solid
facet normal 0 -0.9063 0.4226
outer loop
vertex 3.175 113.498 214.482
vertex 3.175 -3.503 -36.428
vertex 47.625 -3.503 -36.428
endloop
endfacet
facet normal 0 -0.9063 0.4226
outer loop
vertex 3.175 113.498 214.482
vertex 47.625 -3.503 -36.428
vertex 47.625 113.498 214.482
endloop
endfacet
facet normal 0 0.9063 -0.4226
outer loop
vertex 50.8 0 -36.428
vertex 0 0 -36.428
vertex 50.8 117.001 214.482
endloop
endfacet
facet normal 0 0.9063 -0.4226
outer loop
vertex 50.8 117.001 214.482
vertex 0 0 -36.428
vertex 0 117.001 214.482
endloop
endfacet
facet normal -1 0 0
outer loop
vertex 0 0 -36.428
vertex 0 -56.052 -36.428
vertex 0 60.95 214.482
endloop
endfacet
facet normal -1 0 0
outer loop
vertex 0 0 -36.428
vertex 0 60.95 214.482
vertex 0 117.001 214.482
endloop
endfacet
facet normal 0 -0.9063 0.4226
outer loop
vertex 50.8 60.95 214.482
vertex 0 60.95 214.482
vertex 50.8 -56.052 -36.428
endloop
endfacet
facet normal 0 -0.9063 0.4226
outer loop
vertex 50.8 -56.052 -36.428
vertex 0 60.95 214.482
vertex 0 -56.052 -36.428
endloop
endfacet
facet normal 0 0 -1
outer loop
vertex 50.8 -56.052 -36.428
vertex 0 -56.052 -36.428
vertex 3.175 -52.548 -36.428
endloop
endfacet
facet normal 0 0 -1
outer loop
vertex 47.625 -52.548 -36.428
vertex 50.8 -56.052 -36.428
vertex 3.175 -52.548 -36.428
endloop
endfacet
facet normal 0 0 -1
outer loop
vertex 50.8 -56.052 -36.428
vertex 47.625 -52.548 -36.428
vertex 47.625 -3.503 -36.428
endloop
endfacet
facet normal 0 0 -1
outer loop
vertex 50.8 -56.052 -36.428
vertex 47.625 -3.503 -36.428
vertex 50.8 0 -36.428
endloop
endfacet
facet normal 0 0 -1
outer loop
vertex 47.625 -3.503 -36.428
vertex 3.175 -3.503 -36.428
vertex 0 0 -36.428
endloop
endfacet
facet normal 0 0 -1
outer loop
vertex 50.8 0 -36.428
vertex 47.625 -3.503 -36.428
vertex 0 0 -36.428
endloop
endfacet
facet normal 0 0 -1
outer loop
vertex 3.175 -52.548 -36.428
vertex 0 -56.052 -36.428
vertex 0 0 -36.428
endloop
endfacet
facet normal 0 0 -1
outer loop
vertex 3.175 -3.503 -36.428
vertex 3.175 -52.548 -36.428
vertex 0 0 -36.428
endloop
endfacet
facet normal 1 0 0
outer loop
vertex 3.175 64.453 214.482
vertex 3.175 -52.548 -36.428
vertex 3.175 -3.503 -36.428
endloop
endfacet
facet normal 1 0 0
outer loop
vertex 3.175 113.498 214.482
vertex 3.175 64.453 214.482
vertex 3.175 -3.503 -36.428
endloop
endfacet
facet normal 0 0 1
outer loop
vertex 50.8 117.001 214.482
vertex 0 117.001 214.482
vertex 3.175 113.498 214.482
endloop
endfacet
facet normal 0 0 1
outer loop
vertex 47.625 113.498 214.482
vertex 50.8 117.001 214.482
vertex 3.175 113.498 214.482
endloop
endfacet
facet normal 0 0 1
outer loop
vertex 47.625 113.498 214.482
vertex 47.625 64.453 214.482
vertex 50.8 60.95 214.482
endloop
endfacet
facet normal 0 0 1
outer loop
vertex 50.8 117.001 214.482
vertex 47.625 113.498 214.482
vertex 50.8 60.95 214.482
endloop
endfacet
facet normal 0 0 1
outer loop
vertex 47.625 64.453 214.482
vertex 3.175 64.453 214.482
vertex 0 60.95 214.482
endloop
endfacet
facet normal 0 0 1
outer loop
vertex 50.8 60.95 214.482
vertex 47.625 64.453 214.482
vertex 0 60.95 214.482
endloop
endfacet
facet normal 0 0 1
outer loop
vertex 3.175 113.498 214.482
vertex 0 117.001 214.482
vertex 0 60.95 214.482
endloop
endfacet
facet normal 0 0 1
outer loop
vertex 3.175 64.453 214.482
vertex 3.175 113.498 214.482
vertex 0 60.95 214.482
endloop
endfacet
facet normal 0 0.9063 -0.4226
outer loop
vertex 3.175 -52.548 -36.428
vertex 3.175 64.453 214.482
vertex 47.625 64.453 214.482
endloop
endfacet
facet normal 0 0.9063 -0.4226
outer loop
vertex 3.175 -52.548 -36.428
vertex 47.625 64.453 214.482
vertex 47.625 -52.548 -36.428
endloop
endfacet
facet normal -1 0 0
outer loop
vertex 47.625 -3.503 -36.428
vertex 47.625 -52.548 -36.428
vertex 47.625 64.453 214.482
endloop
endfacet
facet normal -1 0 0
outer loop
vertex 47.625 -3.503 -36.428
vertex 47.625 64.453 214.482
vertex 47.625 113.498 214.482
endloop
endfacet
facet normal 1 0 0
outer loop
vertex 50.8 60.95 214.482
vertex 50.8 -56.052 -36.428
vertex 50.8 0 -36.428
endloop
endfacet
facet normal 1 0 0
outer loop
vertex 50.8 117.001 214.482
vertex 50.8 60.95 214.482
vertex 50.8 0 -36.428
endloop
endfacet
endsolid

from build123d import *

# Parameters (mm, degrees)
F1_DEPTH = 50.8
F2_T     = -3.175


with BuildPart() as f1:
    # F0 (on Right) → F1 (new body)
    with BuildSketch(Plane.YZ):
        Polygon((0, -36.428121), (117.0012, 214.481761), (60.949601, 214.481761), (-56.051598, -36.428121), align=None)
    extrude(amount=F1_DEPTH)

    # F2
    f2_openings = [f1.faces().sort_by_distance(p)[0] for p in [
        (25.4, -28.025799, -36.428121),
        (25.4, 88.975401, 214.481761),
    ]]
    offset(amount=F2_T, openings=f2_openings)


solid = f1.part
